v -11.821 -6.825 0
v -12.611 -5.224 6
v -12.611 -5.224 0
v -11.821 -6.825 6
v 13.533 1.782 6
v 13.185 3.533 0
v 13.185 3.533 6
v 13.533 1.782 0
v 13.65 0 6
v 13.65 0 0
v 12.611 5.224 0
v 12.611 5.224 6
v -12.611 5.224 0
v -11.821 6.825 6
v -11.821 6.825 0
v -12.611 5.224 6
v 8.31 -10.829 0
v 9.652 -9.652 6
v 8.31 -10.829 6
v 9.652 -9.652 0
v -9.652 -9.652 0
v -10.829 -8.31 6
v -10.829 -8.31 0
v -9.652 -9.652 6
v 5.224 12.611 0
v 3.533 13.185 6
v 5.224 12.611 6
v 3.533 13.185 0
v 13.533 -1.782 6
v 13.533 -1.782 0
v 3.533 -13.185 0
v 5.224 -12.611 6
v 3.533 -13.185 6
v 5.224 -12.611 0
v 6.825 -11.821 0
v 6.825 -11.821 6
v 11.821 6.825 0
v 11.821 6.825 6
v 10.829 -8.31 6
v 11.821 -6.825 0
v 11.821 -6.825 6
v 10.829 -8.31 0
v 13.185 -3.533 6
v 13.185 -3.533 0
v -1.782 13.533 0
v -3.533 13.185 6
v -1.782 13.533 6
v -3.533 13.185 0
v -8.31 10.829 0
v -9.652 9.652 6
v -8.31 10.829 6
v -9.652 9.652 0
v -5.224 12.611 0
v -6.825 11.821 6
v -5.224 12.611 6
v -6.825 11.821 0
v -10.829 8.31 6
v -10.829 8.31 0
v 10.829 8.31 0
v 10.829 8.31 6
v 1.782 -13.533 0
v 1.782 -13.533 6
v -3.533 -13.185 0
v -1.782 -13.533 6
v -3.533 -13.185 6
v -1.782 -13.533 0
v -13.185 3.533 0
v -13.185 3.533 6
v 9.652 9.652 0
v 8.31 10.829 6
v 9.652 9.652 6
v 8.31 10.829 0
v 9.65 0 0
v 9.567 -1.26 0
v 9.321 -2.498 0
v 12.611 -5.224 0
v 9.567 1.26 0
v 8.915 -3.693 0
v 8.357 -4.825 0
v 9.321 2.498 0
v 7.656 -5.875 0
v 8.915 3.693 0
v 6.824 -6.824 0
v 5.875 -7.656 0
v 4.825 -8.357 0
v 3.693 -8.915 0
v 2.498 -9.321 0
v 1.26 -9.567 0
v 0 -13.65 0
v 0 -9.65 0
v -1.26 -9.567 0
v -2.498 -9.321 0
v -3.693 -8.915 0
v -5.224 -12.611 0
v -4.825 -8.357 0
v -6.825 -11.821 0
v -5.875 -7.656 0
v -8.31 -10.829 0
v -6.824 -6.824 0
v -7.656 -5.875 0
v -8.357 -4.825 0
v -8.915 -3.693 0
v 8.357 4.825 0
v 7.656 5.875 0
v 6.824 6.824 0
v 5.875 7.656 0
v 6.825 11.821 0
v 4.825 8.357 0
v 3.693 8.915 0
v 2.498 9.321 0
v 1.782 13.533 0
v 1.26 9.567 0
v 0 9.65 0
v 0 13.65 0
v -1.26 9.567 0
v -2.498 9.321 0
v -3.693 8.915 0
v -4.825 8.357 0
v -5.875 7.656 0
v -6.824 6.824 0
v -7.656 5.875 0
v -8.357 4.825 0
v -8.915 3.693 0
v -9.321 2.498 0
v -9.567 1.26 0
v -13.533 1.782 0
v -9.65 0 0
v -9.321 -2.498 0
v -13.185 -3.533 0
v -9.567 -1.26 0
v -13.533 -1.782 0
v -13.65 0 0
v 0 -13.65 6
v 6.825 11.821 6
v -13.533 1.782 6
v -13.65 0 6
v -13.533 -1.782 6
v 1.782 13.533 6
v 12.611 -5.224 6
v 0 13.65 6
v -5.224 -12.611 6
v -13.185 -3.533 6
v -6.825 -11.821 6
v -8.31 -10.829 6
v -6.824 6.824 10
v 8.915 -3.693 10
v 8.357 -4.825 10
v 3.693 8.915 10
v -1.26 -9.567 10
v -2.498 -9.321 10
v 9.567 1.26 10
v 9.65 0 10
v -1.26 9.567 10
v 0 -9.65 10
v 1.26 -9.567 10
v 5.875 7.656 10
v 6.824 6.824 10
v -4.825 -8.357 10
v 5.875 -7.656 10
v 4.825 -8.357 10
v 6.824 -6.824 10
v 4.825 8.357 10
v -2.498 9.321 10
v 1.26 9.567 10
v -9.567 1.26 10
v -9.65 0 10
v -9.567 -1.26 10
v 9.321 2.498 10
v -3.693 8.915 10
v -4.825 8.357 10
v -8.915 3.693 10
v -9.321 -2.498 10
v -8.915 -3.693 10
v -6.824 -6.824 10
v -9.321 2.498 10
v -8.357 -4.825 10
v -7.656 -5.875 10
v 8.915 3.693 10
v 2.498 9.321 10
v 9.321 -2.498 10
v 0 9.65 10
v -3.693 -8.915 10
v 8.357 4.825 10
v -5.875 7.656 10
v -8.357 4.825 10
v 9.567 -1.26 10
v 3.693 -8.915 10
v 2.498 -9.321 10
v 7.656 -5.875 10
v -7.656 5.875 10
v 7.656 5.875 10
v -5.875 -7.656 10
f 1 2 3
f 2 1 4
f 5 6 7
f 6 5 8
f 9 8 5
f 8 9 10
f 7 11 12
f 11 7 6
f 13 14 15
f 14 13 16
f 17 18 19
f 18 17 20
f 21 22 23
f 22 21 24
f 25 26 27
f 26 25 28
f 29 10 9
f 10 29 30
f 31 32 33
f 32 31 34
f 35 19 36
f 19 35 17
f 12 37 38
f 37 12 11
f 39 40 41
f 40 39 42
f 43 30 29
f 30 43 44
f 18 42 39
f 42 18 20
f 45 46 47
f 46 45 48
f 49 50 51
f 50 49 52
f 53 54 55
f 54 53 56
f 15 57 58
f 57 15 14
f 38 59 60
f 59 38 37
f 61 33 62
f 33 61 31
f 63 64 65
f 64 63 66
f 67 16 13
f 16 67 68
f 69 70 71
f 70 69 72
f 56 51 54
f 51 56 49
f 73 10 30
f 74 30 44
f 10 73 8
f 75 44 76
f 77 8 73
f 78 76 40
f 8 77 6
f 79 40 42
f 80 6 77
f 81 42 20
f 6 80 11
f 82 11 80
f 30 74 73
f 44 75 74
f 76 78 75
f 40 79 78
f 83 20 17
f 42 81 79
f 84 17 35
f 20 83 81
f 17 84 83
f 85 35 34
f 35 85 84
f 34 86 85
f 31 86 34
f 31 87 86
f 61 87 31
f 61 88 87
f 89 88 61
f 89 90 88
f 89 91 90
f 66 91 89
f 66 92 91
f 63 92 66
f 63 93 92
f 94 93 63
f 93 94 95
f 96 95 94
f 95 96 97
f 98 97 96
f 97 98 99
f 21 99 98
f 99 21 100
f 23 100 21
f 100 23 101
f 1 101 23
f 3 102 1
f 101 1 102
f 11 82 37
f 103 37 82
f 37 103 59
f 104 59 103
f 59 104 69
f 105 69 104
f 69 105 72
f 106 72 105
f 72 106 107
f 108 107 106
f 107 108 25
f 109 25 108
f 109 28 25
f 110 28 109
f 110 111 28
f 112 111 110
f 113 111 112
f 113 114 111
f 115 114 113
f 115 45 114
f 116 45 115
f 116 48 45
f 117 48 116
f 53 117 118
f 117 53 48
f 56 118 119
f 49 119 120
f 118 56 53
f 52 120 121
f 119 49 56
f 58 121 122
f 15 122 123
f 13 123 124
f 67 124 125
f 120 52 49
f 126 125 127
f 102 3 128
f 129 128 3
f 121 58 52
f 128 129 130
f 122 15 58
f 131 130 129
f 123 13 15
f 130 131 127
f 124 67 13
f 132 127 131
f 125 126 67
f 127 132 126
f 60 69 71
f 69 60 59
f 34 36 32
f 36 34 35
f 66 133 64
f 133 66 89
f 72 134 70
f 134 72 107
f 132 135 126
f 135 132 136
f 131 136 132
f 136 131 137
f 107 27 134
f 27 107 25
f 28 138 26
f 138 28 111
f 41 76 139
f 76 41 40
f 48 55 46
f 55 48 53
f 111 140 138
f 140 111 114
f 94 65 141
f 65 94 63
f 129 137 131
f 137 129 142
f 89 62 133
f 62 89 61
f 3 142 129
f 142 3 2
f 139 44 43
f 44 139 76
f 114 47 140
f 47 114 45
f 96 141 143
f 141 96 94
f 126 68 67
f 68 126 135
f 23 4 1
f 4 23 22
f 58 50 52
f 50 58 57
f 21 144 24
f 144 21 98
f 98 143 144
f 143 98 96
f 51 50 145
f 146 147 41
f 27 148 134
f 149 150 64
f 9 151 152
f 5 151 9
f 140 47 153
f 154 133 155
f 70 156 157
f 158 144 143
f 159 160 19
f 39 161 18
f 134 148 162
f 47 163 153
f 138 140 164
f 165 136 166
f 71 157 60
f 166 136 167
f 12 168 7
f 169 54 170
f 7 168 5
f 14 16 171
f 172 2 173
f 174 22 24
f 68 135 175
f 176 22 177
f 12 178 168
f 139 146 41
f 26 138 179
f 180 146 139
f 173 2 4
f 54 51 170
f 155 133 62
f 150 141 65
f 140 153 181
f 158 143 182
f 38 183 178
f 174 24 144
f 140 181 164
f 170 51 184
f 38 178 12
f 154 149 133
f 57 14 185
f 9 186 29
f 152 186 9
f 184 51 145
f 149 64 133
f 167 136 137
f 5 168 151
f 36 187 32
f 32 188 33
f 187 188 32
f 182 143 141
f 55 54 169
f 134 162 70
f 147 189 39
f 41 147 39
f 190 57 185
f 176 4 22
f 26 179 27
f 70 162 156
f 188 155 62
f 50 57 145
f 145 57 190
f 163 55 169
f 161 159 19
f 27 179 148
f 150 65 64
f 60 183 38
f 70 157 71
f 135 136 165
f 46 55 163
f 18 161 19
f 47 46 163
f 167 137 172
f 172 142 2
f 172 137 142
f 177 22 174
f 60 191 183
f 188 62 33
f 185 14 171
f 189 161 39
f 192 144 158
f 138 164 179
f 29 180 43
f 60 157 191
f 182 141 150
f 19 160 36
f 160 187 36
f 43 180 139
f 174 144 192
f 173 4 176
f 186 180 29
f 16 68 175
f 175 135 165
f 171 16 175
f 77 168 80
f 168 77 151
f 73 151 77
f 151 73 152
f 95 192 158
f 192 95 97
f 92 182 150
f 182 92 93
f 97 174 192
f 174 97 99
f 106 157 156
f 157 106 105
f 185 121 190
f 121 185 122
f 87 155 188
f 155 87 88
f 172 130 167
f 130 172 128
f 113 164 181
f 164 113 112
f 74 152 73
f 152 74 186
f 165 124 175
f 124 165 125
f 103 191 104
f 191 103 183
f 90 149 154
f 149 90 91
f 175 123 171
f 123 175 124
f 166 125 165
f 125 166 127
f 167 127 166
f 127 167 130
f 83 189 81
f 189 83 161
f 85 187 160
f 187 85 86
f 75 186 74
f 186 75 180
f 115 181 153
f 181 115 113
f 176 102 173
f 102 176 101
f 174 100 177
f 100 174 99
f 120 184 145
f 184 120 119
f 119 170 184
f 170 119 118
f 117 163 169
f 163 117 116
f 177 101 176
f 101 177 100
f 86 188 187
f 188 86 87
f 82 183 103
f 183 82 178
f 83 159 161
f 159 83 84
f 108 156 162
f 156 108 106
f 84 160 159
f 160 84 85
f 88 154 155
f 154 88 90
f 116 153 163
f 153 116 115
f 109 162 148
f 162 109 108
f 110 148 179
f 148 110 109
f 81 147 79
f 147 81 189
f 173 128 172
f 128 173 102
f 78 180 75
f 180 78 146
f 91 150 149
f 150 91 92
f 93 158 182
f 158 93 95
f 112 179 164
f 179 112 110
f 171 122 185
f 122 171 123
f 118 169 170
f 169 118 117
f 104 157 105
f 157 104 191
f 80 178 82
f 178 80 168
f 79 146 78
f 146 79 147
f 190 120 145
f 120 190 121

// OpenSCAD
// Copyright 2017 Arthur Davis (thingiverse.com/artdavis)
// This file is licensed under a Creative Commons Attribution 4.0
// International License.
// THE SOFTWARE IS PROVIDED "AS IS", WITHOUT WARRANTY OF ANY KIND, EXPRESS OR
// IMPLIED, INCLUDING BUT NOT LIMITED TO THE WARRANTIES OF MERCHANTABILITY,
// FITNESS FOR A PARTICULAR PURPOSE AND NONINFRINGEMENT. IN NO EVENT SHALL THE
// AUTHORS OR COPYRIGHT HOLDERS BE LIABLE FOR ANY CLAIM, DAMAGES OR OTHER
// LIABILITY, WHETHER IN AN ACTION OF CONTRACT, TORT OR OTHERWISE, ARISING
// FROM, OUT OF OR IN CONNECTION WITH THE SOFTWARE OR THE USE OR OTHER
// DEALINGS IN THE SOFTWARE.
//
// Tapered rings that may be conveniently used as cutting/marking
// guides about the circumference of rocket body tubes.
//
// Outer diameters for Estes body tubes
// Ref: http://www.estesrockets.com
// BT-5: 13.8mm
// BT-20: 18.7mm // set diam=19.3
// BT-50: 24.8mm // set diam=25.4
// BT-55: 34.0mm
// BT-60: 42.0mm

// Optimize view for Makerbot Customizer:
// preview[view:south east, tilt:top diagonal]

// Body Tube Outer Diameter
diam = 19.3; // [5:0.1:60]
// Wall thickness
wall_th = 4.0; // [1:0.1:10]
// Height of the guide from top to bottom
height = 10.0; // [1:0.1:40]
// Slope angle of the taper in degrees (0 is no taper)
slope = 45.0; // [0:5:70]

/* [Hidden] */
// Special variables for facets/arcs
$fn = 48;
// Overlap offset for improved CSG operations
delta = 0.1;
// Outer diameter of the guide
od = diam + 2*wall_th;
// Height of the taper
tht = tan(slope) * wall_th;

difference() {
    union() {
        // Base cylinder
        cylinder(h=height - tht, d=od);
        translate(v = [0, 0, height - tht]) {
            // Taper
            cylinder(h=tht, d1=od, d2=diam);
        }
    }
    // Center hole
    cylinder(h=2*(height + delta), d=diam, center=true);
}
